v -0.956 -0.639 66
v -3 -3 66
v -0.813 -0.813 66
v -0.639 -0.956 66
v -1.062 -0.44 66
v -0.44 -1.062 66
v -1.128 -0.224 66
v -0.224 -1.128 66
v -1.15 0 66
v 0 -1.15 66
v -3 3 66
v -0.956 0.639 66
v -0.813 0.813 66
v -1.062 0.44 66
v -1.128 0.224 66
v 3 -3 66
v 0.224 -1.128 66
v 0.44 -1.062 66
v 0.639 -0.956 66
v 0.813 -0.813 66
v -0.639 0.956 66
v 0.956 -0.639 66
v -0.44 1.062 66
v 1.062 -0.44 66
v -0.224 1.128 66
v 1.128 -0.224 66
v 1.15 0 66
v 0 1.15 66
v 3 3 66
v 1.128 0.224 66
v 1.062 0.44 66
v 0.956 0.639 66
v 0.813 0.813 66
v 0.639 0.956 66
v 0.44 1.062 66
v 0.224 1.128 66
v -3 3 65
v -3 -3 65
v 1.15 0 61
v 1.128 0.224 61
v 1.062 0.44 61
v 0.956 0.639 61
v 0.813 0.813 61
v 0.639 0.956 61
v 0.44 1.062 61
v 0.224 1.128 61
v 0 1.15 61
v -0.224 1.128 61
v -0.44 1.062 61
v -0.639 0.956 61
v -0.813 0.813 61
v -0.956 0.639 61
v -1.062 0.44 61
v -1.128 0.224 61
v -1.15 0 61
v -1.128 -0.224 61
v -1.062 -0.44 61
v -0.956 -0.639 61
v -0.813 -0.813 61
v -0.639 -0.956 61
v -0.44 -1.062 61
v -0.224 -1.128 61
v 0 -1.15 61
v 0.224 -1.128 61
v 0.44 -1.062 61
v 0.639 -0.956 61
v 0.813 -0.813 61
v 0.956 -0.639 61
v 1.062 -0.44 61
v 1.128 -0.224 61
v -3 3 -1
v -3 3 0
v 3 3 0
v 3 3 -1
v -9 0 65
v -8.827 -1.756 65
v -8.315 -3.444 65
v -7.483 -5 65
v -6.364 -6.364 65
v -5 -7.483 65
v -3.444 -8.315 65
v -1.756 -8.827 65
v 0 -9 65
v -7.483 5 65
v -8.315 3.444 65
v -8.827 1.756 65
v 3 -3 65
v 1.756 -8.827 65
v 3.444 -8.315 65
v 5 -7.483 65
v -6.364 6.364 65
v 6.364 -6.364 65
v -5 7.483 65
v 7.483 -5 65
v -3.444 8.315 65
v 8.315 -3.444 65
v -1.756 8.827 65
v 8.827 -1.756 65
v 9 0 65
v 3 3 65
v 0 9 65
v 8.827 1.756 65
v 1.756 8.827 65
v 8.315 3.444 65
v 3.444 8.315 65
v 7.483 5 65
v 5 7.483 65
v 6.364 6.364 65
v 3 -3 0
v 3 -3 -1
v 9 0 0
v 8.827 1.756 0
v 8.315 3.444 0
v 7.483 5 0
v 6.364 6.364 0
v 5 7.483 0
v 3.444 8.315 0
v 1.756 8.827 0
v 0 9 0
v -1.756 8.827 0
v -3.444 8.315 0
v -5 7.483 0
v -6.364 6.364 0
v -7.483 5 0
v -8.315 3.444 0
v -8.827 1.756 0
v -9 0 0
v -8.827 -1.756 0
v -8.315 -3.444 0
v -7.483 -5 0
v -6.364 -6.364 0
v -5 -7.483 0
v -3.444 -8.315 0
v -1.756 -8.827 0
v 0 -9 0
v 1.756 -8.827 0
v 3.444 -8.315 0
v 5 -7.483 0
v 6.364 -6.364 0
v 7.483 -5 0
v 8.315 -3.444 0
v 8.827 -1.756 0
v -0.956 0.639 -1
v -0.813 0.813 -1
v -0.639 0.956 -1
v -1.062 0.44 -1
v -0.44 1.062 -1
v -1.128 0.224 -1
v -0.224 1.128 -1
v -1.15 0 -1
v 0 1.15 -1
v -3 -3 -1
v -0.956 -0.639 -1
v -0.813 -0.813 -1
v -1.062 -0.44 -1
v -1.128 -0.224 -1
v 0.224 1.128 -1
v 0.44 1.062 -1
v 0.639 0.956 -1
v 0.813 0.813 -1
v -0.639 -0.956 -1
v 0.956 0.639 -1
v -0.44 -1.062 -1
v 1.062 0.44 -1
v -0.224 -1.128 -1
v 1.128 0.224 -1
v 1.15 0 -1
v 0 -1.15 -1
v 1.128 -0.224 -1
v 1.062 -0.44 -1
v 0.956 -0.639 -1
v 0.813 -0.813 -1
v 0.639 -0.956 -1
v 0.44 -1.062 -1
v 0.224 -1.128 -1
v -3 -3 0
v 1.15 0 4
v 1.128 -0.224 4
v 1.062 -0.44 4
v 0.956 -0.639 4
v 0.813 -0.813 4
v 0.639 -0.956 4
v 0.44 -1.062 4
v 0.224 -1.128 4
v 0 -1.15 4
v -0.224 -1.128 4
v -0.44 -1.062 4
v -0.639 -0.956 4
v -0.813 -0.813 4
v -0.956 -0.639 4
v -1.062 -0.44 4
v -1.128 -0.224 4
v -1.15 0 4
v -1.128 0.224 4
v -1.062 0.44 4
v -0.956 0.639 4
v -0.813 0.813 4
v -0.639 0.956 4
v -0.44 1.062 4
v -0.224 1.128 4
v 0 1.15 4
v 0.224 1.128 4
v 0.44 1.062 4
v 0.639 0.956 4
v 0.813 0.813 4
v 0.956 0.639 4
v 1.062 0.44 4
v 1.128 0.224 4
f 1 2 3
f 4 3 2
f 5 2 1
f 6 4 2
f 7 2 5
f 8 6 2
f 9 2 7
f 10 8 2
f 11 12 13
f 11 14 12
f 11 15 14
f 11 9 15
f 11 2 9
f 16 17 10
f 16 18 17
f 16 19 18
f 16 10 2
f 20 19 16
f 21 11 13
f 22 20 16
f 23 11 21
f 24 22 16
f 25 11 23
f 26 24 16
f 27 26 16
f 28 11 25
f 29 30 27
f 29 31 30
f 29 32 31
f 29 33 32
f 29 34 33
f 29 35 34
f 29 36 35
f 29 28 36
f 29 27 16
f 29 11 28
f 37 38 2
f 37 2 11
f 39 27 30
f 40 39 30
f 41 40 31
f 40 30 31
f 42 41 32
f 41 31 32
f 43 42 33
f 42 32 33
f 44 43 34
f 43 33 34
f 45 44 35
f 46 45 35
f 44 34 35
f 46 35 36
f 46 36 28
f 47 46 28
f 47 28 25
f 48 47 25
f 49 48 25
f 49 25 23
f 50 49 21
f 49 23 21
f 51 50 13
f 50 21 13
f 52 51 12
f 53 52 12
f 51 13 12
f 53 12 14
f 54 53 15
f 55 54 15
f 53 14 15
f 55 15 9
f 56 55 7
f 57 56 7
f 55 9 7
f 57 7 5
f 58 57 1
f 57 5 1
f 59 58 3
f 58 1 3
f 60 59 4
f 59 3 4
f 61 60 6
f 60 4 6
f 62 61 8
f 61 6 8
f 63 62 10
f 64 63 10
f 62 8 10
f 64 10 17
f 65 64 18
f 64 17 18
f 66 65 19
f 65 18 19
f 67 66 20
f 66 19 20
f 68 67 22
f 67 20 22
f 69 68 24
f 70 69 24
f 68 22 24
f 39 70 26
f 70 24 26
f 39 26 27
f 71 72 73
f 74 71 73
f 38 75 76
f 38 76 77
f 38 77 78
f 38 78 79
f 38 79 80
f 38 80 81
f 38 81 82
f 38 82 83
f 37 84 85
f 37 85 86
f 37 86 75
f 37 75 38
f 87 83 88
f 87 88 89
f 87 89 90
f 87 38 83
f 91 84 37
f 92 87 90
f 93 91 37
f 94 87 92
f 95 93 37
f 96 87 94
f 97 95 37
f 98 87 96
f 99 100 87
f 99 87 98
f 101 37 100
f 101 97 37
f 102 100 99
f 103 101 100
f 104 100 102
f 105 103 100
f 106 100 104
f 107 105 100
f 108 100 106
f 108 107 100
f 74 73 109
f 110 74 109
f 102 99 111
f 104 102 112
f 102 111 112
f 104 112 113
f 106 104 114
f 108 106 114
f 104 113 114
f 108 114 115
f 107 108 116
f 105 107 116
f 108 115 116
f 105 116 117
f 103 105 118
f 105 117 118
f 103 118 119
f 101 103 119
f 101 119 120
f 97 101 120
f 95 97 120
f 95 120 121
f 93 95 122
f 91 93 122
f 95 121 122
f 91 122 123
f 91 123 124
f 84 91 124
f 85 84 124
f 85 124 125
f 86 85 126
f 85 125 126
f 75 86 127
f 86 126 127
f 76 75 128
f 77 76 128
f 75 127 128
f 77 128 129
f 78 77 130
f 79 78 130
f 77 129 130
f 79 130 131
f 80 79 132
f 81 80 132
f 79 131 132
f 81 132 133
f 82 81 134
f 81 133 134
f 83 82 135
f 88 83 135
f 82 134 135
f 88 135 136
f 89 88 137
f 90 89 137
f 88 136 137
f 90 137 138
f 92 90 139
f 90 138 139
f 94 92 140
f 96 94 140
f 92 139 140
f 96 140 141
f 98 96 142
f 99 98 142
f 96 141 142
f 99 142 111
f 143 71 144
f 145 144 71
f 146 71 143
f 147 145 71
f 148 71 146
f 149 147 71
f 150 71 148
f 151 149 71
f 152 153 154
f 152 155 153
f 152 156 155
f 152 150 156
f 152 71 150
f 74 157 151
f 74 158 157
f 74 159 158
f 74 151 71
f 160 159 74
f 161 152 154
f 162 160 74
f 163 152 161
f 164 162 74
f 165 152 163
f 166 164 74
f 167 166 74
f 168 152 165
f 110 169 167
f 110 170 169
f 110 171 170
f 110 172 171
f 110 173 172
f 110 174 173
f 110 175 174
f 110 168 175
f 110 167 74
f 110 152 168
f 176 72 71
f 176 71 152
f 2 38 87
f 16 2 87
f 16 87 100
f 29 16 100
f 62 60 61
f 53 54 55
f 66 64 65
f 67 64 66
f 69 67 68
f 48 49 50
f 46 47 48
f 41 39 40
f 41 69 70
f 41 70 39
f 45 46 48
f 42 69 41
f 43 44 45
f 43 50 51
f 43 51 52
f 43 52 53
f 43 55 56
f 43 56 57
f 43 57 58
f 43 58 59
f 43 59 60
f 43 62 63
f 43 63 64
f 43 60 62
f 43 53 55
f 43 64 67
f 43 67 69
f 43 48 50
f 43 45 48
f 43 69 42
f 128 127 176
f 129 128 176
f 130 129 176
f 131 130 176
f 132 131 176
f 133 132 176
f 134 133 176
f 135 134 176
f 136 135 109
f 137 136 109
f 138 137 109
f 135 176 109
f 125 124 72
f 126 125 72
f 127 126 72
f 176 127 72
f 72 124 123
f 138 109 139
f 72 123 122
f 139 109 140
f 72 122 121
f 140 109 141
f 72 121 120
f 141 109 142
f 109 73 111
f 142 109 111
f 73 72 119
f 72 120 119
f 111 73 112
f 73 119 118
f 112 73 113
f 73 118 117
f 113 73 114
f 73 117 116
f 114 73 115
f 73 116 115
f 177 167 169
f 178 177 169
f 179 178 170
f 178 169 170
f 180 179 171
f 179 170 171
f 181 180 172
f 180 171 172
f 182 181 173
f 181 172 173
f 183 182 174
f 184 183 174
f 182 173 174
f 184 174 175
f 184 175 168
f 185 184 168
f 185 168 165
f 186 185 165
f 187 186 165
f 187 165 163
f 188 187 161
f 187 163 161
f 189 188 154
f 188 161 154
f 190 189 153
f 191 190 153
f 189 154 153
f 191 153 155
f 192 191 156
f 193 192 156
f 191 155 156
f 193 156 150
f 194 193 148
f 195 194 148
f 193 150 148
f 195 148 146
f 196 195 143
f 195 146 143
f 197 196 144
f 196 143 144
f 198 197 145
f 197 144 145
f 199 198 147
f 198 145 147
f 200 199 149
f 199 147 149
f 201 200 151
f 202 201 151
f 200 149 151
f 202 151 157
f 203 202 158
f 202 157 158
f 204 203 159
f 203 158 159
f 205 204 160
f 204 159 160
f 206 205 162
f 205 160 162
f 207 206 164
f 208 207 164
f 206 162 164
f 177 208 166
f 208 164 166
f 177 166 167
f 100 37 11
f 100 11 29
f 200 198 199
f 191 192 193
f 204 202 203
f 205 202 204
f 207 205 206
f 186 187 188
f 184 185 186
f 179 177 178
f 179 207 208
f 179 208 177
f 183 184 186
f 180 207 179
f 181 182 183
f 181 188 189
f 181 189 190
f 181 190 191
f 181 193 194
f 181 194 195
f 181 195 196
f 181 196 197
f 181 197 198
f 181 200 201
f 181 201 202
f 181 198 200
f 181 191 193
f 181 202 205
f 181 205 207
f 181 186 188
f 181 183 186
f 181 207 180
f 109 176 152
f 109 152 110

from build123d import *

# Parameters (mm, degrees)
SKETCH_R        = 9
PAD_DEPTH       = 65
SKETCH001_W     = 6
SKETCH001_H     = 6
PAD001_DEPTH    = 1
SKETCH002_R     = 1.15
POCKET_DEPTH    = 5
SKETCH003_W     = 6
SKETCH003_H     = 6
PAD002_DEPTH    = 1
SKETCH004_R     = 1.15
POCKET001_DEPTH = 5


with BuildPart() as part:
    # Sketch → Pad (new body)
    with BuildSketch(Plane.XY):
        Circle(SKETCH_R)
    extrude(amount=PAD_DEPTH)

    # Sketch001 (on Face3 of Pad) → Pad001 (join)
    with BuildSketch(Plane.XY.offset(65)):
        Rectangle(SKETCH001_W, SKETCH001_H)
    extrude(amount=PAD001_DEPTH)

    # Sketch002 (on Face8 of Pad001) → Pocket (cut)
    with BuildSketch(Plane.XY.offset(66)):
        Circle(SKETCH002_R)
    extrude(amount=-POCKET_DEPTH, mode=Mode.SUBTRACT)

    # Sketch003 (on Face2 of Pocket) → Pad002 (join)
    with BuildSketch(Plane(origin=(0, 0, 0), x_dir=(1, 0, 0), z_dir=(0, 0, -1))):
        Rectangle(SKETCH003_W, SKETCH003_H)
    extrude(amount=PAD002_DEPTH)

    # Sketch004 (on Face12 of Pad002) → Pocket001 (cut)
    with BuildSketch(Plane(origin=(0, 0, -1), x_dir=(1, 0, 0), z_dir=(0, 0, -1))):
        Circle(SKETCH004_R)
    extrude(amount=-POCKET001_DEPTH, mode=Mode.SUBTRACT)


solid = part.part
